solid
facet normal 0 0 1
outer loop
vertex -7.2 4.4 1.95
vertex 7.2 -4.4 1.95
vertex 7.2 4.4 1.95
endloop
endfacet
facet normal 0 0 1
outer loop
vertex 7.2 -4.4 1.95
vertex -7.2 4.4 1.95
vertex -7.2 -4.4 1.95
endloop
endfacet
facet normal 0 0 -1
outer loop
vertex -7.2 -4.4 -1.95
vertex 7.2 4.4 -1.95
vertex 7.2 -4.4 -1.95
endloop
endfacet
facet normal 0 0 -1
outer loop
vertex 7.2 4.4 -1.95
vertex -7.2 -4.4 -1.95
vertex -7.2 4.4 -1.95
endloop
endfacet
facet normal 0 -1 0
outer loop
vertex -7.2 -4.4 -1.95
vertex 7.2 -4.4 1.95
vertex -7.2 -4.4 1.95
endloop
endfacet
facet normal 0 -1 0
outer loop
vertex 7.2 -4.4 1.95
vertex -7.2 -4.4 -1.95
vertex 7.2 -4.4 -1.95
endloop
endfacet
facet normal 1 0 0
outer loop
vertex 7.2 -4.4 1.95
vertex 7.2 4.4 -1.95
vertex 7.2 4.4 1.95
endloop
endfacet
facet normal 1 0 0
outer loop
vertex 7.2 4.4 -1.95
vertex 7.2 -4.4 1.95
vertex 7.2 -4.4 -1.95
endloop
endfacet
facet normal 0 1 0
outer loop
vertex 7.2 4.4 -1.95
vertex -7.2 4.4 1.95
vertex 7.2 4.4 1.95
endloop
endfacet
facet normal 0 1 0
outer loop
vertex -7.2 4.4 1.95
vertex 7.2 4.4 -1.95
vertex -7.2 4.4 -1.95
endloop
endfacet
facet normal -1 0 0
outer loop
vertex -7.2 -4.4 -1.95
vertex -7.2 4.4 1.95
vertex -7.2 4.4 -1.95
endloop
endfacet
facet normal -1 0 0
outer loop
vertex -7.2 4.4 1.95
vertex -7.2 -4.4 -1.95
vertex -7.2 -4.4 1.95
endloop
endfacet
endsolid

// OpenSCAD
$fn=50;

function ConnectorLength() = 14;
function ConnectorWidth() = 8.4; 
function ConnectorHeight() = 3.5;

//Note: each pin is approximately 2.25mm wide.  this is a 3 pin connector.

module ServoConnector(3dPrinterTolerance=.4){
	translate(-[(ConnectorLength()+3dPrinterTolerance)/2,(ConnectorWidth()+3dPrinterTolerance)/2,(ConnectorHeight()+3dPrinterTolerance)/2]){
		cube([ConnectorLength()+3dPrinterTolerance,ConnectorWidth()+3dPrinterTolerance,ConnectorHeight()+3dPrinterTolerance]);
	}
}

ServoConnector(.4);
